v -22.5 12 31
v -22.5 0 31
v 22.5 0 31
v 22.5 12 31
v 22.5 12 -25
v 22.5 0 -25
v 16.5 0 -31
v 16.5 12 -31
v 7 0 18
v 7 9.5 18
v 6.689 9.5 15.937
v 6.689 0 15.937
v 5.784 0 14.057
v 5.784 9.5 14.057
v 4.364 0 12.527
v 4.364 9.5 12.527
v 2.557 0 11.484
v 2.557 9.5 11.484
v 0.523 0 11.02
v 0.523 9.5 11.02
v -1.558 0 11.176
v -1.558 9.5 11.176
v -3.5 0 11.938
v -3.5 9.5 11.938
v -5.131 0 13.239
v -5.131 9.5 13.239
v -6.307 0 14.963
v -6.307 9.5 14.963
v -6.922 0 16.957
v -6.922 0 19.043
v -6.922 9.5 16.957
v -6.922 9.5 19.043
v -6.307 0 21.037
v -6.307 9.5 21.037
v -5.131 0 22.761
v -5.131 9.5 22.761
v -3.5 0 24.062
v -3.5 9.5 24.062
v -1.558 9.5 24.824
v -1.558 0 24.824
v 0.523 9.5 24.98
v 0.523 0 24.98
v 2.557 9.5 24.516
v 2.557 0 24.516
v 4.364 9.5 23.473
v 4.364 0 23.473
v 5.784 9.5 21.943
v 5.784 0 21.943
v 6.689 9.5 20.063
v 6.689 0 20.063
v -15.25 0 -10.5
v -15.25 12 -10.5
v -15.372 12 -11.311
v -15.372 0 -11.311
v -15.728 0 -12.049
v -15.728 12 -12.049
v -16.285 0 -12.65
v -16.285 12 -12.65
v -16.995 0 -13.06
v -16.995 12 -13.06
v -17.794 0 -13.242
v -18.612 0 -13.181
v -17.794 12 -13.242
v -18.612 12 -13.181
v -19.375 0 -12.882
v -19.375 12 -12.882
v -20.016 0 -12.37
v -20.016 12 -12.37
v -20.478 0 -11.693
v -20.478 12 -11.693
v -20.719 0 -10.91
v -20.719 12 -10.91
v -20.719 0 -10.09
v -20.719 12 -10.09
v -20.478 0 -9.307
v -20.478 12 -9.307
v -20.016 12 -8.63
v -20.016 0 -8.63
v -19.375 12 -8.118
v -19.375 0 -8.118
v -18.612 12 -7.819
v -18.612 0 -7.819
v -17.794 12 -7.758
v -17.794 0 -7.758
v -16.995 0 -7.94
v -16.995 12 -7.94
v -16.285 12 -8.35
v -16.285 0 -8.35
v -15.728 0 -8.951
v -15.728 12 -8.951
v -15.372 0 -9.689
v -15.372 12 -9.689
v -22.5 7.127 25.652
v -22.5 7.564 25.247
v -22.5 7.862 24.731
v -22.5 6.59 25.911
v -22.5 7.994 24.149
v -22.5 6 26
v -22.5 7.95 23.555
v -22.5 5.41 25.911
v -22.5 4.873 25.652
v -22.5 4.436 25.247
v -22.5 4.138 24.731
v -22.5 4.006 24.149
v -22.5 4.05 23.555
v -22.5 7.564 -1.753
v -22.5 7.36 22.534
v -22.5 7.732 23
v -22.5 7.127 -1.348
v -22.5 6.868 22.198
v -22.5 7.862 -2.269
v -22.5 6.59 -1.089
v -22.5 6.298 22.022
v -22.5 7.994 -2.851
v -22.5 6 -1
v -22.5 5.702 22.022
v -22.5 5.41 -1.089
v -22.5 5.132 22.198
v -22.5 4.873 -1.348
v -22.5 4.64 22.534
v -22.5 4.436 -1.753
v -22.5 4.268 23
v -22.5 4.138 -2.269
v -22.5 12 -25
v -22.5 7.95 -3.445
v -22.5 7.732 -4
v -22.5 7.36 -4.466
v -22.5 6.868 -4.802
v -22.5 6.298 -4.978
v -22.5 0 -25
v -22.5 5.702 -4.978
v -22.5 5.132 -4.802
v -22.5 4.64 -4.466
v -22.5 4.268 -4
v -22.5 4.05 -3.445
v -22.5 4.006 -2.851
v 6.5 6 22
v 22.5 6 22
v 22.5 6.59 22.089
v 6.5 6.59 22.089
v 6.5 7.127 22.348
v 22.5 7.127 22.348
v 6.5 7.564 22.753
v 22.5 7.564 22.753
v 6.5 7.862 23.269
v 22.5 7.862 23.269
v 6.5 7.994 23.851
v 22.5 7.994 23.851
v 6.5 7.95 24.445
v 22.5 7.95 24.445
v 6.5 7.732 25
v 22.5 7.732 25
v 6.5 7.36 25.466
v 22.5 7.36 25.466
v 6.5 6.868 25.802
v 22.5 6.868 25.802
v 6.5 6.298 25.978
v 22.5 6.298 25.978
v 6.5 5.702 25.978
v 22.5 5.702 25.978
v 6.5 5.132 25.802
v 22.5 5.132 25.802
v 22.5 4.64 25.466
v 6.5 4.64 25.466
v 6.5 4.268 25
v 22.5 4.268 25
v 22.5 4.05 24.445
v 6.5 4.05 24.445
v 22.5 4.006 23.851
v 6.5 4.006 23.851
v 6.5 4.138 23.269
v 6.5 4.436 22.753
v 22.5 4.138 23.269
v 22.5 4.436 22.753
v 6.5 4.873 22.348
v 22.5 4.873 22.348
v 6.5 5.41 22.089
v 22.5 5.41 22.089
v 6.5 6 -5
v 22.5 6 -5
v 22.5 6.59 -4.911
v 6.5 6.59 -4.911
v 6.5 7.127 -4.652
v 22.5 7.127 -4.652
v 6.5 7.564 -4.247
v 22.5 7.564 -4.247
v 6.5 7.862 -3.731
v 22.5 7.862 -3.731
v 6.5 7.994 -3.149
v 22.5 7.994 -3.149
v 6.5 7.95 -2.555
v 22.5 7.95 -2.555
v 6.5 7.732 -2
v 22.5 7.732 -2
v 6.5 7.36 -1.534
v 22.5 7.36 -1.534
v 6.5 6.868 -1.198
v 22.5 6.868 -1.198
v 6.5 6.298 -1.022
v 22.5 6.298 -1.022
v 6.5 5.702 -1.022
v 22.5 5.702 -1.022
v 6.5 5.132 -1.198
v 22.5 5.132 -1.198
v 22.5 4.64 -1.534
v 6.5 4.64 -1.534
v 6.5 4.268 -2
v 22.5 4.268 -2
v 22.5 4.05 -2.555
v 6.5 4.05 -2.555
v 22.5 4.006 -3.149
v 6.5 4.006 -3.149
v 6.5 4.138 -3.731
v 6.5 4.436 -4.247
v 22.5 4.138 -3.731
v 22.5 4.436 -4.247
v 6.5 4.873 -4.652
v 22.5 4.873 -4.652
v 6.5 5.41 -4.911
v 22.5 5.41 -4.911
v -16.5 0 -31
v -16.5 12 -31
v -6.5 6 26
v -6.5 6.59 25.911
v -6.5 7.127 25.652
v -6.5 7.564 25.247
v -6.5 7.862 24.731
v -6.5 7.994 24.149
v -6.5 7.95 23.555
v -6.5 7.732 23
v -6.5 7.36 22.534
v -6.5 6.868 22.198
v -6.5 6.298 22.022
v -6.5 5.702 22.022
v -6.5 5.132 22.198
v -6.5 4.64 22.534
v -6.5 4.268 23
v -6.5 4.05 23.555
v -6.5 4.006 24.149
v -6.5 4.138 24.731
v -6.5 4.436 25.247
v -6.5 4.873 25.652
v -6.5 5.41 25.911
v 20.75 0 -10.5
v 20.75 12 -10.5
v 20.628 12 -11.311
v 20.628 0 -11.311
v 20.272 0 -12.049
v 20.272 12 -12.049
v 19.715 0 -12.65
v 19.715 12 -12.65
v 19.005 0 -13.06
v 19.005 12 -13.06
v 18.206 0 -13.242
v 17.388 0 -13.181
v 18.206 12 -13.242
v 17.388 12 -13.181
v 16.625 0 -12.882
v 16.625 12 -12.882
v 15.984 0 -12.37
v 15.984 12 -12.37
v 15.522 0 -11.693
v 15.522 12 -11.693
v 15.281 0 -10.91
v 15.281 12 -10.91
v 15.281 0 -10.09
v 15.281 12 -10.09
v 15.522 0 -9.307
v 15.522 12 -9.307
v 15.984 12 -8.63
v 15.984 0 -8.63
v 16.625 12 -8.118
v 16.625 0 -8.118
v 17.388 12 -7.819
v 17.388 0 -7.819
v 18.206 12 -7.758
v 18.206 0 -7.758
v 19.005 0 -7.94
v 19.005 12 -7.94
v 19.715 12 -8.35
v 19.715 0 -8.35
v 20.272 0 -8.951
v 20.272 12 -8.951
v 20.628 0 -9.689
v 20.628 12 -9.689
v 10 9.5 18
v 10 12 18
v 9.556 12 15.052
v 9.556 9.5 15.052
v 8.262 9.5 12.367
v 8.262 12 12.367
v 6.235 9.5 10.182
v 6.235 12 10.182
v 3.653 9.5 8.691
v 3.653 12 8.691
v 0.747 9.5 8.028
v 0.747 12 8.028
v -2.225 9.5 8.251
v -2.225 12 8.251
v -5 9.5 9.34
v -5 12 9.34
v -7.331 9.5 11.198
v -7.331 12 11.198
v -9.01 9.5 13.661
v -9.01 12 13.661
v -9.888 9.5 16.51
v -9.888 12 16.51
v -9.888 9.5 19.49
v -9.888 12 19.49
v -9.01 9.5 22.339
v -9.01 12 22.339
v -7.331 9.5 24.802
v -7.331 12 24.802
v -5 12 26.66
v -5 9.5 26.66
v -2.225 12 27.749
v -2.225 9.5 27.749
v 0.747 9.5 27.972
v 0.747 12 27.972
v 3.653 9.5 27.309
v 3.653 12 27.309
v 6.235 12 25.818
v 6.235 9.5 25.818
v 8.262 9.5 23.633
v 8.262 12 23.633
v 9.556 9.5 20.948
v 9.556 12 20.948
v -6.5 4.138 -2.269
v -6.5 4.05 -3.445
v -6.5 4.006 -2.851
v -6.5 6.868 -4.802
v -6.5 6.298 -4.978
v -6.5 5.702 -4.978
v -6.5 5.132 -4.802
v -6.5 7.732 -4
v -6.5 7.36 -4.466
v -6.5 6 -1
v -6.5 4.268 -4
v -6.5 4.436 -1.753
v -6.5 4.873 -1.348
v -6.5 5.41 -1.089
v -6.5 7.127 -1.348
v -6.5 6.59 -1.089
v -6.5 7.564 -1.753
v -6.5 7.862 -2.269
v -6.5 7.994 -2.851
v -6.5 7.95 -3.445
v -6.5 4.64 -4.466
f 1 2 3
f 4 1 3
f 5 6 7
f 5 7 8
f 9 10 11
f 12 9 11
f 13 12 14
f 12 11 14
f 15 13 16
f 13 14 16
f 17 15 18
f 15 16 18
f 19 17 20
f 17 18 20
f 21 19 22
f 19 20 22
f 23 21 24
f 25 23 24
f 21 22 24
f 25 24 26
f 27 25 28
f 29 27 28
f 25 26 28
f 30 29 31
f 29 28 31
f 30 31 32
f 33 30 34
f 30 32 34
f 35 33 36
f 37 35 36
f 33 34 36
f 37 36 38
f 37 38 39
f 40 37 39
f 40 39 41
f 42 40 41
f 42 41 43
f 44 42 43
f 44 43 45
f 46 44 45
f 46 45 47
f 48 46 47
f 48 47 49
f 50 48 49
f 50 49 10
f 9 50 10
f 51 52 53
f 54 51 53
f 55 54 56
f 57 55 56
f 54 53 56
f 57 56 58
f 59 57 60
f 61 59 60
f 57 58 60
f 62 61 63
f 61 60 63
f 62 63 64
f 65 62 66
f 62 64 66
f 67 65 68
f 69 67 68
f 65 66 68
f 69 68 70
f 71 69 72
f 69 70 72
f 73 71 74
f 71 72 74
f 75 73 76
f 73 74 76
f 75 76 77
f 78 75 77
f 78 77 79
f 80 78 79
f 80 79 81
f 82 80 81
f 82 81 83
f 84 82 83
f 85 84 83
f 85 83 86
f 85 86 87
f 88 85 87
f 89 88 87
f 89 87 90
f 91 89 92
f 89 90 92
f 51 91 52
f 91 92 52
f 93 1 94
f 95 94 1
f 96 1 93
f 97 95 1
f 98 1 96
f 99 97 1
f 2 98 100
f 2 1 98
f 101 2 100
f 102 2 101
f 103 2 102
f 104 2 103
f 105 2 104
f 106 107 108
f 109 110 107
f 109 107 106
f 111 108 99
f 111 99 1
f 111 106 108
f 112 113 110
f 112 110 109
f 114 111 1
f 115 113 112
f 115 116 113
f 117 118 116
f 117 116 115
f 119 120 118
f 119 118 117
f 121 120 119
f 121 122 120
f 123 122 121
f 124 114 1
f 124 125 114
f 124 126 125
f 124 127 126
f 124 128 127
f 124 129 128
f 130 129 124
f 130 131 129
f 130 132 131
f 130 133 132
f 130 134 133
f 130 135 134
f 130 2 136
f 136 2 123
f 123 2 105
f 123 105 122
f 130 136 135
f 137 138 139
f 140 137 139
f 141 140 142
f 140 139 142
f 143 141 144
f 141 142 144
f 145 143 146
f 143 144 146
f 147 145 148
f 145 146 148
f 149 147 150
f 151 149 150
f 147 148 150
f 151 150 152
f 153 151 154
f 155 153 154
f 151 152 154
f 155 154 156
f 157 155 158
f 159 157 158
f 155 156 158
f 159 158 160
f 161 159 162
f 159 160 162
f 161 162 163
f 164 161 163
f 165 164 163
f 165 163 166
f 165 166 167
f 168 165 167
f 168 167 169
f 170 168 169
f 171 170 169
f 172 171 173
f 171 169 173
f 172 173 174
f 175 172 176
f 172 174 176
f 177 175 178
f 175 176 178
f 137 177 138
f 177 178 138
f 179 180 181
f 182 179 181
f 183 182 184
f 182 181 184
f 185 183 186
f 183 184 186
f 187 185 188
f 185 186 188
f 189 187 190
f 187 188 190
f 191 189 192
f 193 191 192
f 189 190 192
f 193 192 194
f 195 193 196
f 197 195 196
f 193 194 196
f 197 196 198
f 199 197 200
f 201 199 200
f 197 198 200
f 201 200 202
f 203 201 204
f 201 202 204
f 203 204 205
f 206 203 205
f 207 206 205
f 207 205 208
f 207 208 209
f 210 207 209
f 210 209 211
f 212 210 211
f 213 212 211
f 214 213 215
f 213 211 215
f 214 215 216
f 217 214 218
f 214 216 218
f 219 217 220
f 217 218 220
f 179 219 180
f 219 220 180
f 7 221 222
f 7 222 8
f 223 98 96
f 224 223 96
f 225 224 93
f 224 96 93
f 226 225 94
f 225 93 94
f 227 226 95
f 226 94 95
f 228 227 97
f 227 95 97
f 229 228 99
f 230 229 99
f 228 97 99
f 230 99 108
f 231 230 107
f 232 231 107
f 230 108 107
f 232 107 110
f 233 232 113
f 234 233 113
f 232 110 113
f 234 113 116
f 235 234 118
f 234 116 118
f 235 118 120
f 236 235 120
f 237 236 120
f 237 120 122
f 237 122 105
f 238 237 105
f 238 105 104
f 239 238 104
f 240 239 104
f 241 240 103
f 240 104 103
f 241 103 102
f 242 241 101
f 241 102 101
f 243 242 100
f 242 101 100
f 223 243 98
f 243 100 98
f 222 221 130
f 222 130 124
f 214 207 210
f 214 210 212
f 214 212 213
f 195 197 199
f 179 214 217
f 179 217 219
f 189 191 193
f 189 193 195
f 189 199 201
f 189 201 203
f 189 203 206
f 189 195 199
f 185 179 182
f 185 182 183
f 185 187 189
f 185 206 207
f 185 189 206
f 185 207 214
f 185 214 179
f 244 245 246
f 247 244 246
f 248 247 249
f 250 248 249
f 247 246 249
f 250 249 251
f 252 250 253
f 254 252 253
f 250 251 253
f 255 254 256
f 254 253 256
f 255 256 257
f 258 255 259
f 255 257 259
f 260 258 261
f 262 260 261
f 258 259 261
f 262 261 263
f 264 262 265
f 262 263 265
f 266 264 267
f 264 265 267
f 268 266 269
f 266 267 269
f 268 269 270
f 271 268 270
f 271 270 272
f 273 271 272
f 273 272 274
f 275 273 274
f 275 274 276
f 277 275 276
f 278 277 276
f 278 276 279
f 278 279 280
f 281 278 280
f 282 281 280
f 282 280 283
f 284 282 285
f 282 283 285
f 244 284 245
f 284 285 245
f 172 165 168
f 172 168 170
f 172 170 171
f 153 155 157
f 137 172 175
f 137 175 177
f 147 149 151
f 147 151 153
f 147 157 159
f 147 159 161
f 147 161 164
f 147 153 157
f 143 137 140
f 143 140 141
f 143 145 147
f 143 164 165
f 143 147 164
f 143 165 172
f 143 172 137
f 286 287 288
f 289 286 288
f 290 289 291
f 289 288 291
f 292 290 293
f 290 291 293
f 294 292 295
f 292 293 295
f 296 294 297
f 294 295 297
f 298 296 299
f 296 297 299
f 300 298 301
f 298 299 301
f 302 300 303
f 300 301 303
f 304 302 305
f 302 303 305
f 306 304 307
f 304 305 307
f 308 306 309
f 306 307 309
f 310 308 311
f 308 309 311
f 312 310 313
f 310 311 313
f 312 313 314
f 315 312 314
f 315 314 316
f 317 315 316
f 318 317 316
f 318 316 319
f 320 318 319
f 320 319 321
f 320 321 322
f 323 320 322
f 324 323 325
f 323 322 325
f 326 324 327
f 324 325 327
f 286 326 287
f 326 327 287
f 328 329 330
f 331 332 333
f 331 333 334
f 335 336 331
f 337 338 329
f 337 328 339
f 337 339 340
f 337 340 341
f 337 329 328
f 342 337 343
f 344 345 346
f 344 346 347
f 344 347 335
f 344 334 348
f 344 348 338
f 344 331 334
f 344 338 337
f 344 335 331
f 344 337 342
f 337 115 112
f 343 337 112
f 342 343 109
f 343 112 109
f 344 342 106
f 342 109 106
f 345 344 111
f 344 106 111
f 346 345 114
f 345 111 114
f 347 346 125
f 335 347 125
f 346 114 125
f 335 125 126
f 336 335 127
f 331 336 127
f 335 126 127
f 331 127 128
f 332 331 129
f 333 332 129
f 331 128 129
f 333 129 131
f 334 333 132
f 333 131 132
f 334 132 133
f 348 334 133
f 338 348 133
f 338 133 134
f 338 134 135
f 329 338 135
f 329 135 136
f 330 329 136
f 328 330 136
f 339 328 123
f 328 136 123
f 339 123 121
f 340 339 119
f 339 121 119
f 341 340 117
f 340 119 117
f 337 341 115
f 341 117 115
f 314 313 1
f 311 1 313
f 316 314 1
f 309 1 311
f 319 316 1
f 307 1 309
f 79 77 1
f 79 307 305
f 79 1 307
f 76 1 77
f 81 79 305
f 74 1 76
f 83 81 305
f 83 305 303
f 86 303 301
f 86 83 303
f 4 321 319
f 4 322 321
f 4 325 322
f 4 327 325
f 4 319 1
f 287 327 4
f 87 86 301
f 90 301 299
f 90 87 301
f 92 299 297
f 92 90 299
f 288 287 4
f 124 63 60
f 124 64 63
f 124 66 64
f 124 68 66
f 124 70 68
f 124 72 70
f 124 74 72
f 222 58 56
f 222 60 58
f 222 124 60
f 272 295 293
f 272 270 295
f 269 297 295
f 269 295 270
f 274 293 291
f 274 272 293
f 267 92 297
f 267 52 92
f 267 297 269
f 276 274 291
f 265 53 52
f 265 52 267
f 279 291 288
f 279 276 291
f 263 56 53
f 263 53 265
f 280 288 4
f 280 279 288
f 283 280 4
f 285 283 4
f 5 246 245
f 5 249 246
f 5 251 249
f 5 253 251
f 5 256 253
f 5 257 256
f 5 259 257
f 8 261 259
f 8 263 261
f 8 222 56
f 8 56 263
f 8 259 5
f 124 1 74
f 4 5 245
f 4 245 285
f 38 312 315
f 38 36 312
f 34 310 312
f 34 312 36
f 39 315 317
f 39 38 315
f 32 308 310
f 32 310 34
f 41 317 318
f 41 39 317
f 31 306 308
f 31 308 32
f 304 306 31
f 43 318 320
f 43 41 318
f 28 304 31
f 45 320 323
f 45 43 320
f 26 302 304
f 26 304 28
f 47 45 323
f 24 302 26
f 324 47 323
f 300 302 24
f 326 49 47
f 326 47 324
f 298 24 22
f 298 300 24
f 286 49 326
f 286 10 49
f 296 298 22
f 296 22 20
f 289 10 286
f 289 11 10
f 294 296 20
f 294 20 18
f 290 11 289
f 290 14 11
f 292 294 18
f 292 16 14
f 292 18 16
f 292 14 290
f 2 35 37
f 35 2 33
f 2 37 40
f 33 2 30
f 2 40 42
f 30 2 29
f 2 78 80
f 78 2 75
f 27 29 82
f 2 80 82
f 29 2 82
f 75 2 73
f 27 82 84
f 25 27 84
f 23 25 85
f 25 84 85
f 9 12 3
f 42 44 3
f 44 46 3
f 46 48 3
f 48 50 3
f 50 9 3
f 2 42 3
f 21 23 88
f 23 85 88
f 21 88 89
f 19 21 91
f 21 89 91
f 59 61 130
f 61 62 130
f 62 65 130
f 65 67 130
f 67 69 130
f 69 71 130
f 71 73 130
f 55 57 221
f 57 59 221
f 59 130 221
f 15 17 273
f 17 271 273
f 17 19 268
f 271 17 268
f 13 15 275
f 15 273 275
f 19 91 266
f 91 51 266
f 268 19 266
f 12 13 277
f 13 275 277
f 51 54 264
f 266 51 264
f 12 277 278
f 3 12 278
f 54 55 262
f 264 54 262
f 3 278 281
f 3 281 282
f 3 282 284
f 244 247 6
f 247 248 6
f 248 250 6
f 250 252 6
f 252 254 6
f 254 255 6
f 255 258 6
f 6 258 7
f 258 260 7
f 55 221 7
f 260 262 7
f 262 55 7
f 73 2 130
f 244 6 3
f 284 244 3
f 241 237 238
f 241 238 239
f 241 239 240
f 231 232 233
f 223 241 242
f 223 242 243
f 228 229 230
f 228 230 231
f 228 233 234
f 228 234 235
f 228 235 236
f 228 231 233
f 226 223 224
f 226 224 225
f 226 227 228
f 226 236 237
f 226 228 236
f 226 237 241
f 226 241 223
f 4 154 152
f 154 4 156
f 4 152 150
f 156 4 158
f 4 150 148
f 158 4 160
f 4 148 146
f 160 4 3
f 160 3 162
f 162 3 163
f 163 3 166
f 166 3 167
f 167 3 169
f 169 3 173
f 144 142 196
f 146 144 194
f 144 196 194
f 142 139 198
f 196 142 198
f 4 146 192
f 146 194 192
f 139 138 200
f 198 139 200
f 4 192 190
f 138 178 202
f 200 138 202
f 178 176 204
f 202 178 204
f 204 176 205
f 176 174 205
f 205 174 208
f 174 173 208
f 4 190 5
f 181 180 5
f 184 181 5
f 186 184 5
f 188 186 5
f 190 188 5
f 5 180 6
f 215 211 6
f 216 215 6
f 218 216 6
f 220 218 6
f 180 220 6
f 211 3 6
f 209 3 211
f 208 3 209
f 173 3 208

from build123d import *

# Parameters (mm, degrees)
SKETCH1_W           = 45
SKETCH1_H           = 62
BOSS_EXTRUDE1_DEPTH = 12
SKETCH2_R           = 7
SKETCH2_R_2         = 2.75
CUT_EXTRUDE1_DEPTH  = 12
SKETCH3_R           = 10
CUT_EXTRUDE2_DEPTH  = 2.5
SKETCH4_R           = 2
CUT_EXTRUDE3_DEPTH  = 16
SKETCH5_R           = 2
CUT_EXTRUDE4_DEPTH  = 16
CHAMFER1_SIZE       = 6


with BuildPart() as part:
    # Sketch1 → Boss-Extrude1 (new body)
    with BuildSketch(Plane(origin=(0, 0, 0), x_dir=(1, 0, 0), z_dir=(0, 1, 0))):
        Rectangle(SKETCH1_W, SKETCH1_H)
    extrude(amount=BOSS_EXTRUDE1_DEPTH)

    # Sketch2 → Cut-Extrude1 (cut)
    with BuildSketch(Plane(origin=(0, 12, 0), x_dir=(1, 0, 0), z_dir=(0, 1, 0))):
        with Locations((0, -18)):
            Circle(SKETCH2_R)
        with Locations((-18, 10.5)):
            Circle(SKETCH2_R_2)
        with Locations((18, 10.5)):
            Circle(SKETCH2_R_2)
    extrude(amount=-CUT_EXTRUDE1_DEPTH, mode=Mode.SUBTRACT)

    # Sketch3 → Cut-Extrude2 (cut)
    with BuildSketch(Plane(origin=(0, 12, 0), x_dir=(1, 0, 0), z_dir=(0, 1, 0))):
        with Locations((0, -18)):
            Circle(SKETCH3_R)
    extrude(amount=-CUT_EXTRUDE2_DEPTH, mode=Mode.SUBTRACT)

    # Sketch4 → Cut-Extrude3 (cut)
    with BuildSketch(Plane.ZY.offset(22.5)):
        with Locations((24, 6)):
            Circle(SKETCH4_R)
        with Locations((-3, 6)):
            Circle(SKETCH4_R)
    extrude(amount=-CUT_EXTRUDE3_DEPTH, mode=Mode.SUBTRACT)

    # Sketch5 → Cut-Extrude4 (cut)
    with BuildSketch(Plane(origin=(22.5, 0, 0), x_dir=(0, 0, -1), z_dir=(1, 0, 0))):
        with Locations((-24, 6)):
            Circle(SKETCH5_R)
        with Locations((3, 6)):
            Circle(SKETCH5_R)
    extrude(amount=-CUT_EXTRUDE4_DEPTH, mode=Mode.SUBTRACT)

    # Chamfer1
    chamfer1_edges = [part.edges().sort_by_distance(p)[0] for p in [
        (-22.5, 6, -31),
        (22.5, 6, -31),
    ]]
    chamfer(chamfer1_edges, length=CHAMFER1_SIZE)


solid = part.part
